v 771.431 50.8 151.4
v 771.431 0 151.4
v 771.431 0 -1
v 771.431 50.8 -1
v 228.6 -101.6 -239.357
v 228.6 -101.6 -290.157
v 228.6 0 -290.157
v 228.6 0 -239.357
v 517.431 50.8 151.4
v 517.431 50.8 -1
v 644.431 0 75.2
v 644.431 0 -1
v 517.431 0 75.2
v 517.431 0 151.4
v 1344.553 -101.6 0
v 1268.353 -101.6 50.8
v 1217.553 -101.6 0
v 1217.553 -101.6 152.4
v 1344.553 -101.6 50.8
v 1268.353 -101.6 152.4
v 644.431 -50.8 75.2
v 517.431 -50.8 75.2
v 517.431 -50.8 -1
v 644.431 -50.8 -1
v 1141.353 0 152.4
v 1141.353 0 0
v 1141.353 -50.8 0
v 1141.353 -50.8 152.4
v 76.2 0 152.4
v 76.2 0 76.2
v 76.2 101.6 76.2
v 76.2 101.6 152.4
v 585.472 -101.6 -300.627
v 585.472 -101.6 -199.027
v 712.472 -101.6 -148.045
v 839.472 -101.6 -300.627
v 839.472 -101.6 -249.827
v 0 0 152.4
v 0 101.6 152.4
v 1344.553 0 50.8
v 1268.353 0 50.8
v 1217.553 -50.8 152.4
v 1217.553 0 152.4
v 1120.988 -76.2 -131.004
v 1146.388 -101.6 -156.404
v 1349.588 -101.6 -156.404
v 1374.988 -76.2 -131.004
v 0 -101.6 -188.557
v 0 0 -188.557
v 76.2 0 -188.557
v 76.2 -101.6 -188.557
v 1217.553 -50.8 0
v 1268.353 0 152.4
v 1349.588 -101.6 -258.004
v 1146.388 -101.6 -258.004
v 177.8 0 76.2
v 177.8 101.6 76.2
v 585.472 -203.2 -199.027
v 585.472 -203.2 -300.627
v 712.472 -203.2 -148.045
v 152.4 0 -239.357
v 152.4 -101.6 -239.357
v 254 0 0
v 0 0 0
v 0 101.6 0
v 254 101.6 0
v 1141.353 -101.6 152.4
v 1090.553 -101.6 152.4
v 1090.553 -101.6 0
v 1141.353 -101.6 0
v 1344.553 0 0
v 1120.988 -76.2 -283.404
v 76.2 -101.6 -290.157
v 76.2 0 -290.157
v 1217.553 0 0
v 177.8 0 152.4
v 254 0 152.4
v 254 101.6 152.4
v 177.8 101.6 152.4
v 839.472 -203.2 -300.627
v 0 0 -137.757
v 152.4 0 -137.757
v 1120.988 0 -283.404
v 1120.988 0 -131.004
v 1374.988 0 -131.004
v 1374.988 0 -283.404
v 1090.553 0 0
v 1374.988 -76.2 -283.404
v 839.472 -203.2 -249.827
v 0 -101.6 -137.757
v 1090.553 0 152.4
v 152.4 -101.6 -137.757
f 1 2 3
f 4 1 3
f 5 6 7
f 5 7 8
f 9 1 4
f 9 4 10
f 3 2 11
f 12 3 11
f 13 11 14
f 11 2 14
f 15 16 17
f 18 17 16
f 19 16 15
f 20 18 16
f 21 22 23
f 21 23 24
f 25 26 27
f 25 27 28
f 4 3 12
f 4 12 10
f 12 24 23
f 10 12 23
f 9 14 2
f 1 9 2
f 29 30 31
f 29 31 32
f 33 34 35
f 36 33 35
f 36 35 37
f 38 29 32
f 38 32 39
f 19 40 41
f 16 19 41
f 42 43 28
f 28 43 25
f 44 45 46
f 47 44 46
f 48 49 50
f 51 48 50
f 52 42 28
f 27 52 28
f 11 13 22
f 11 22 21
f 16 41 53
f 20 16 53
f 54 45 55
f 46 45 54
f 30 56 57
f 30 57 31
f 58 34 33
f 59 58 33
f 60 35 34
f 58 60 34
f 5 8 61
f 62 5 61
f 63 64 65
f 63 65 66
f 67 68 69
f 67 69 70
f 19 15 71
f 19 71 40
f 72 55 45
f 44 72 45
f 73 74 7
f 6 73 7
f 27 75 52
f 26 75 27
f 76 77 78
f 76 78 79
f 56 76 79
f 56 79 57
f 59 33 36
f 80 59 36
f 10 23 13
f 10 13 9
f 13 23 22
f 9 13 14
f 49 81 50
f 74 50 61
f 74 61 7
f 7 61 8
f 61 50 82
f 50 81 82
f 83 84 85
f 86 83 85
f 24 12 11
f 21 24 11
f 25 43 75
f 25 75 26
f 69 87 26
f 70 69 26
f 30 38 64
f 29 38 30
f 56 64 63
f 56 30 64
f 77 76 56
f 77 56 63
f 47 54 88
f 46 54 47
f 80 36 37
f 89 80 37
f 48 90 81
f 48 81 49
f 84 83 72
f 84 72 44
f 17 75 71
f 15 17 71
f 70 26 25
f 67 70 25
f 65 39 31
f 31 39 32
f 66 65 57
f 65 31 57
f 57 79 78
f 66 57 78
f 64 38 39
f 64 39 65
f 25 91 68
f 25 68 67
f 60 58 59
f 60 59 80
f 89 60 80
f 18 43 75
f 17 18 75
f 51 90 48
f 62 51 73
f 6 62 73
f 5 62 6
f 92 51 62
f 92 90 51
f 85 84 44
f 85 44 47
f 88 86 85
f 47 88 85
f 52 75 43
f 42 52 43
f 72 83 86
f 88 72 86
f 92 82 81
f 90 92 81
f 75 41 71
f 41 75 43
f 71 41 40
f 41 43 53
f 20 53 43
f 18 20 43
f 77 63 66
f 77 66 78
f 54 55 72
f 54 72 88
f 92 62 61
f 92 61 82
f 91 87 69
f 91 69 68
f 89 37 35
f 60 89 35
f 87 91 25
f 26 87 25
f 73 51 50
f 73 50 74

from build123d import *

# Parameters (mm, degrees)
F1_DEPTH  = 101.6
F2_W      = 127
F2_H      = 76.2
F3_DEPTH  = 50.8
F4_W      = 127
F4_H      = 76.2
F5_DEPTH  = 50.8
F7_DEPTH  = 101.6
F6_W      = 50.8
F6_H      = 152.4
F8_W      = 76.2
F8_H      = 152.4
F9_DEPTH  = 50.8
F11_DEPTH = 101.6
F13_W     = 254
F13_H     = 152.4
F14_DEPTH = 101.6
F15_DEPTH = 101.6
F16_SIZE  = 25.4


# Not quite as in the source:
# - a feature names something its author has since deleted; it is built from what else it names


with BuildPart() as f1:
    # F0 (on Front) → F1 (new body)
    with BuildSketch(Plane.XZ):
        Polygon((0, 152.4), (0, 0), (254, 0), (254, 152.4), (177.8, 152.4), (177.8, 76.2), (76.2, 76.2), (76.2, 152.4), align=None)
    extrude(amount=-F1_DEPTH)


with BuildPart() as f3:
    # F2 (on Front) → F3 (new body)
    with BuildSketch(Plane.XZ):
        with Locations((580.9306057492, 37.1004903008)):
            Rectangle(F2_W, F2_H)
    extrude(amount=F3_DEPTH)

    # F4 (on face) → F5 (join)
    with BuildSketch(Plane(origin=(0, 0, 0), x_dir=(-1, 0, 0), z_dir=(0, 1, 0))):
        with Locations((-580.9306057492, 37.1004903008)):
            Rectangle(F4_W, F4_H)
        Polygon((-771.4306057492, -0.9995096992), (-644.4306057492, -0.9995096992), (-644.4306057492, 75.2004903008), (-517.4306057492, 75.2004903008), (-517.4306057492, 151.4004903008), (-771.4306057492, 151.4004903008), align=None)
    extrude(amount=F5_DEPTH)


with BuildPart() as f7:
    # F6 (on face) → F7 (new body)
    with BuildSketch(Plane.XZ):
        Polygon((1268.3531419389, 152.4), (1217.5531419389, 152.4), (1217.5531419389, 0), (1344.5531419389, 0), (1344.5531419389, 50.8), (1268.3531419389, 50.8), align=None)
    extrude(amount=F7_DEPTH)


with BuildPart() as f7b:
    # F6 (on face) → F7, piece 2 (new body)
    with BuildSketch(Plane.XZ):
        with Locations((1115.9531419389, 76.2)):
            Rectangle(F6_W, F6_H)
    extrude(amount=F7_DEPTH)


with BuildPart() as f9:
    # F8 (on face) → F9 (new body)
    with BuildSketch(Plane(origin=(0, 0, 0), x_dir=(-1, 0, 0), z_dir=(0, 1, 0))):
        with Locations((-1179.4531419389, 76.2)):
            Rectangle(F8_W, F8_H)
    extrude(amount=-F9_DEPTH)


with BuildPart() as f11:
    # F10 (on face) → F11 (new body)
    with BuildSketch(Plane.XZ):
        Polygon((152.4, -137.7568855792), (0, -137.7568855792), (0, -188.5568855792), (76.2, -188.5568855792), (76.2, -290.1568855792), (228.6, -290.1568855792), (228.6, -239.3568855792), (152.4, -239.3568855792), align=None)
    extrude(amount=F11_DEPTH)


with BuildPart() as f14:
    # F13 (on face) → F14 (new body)
    with BuildSketch(Plane.XZ):
        with Locations((1247.9882836342, -207.20400113)):
            Rectangle(F13_W, F13_H)
    extrude(amount=F14_DEPTH)

    # F16
    f16_edges = [f14.edges().sort_by_distance(p)[0] for p in [
        (1247.988284, -101.6, -131.004001),
        (1374.988284, -101.6, -207.204001),
        (1247.988284, -101.6, -283.404001),
        (1120.988284, -101.6, -207.204001),
    ]]
    chamfer(f16_edges, length=F16_SIZE)


with BuildPart() as f15:
    # F12 (on face) → F15 (new body)
    with BuildSketch(Plane.XZ.offset(101.6)):
        Polygon((585.472053026, -199.0268103926), (585.472053026, -300.6268103926), (839.472053026, -300.6268103926), (839.472053026, -249.8268103926), (712.472053026, -148.0449278362), align=None)
    extrude(amount=F15_DEPTH)


solid = Compound([f1.part, f3.part, f7.part, f7b.part, f9.part, f11.part, f14.part, f15.part])
